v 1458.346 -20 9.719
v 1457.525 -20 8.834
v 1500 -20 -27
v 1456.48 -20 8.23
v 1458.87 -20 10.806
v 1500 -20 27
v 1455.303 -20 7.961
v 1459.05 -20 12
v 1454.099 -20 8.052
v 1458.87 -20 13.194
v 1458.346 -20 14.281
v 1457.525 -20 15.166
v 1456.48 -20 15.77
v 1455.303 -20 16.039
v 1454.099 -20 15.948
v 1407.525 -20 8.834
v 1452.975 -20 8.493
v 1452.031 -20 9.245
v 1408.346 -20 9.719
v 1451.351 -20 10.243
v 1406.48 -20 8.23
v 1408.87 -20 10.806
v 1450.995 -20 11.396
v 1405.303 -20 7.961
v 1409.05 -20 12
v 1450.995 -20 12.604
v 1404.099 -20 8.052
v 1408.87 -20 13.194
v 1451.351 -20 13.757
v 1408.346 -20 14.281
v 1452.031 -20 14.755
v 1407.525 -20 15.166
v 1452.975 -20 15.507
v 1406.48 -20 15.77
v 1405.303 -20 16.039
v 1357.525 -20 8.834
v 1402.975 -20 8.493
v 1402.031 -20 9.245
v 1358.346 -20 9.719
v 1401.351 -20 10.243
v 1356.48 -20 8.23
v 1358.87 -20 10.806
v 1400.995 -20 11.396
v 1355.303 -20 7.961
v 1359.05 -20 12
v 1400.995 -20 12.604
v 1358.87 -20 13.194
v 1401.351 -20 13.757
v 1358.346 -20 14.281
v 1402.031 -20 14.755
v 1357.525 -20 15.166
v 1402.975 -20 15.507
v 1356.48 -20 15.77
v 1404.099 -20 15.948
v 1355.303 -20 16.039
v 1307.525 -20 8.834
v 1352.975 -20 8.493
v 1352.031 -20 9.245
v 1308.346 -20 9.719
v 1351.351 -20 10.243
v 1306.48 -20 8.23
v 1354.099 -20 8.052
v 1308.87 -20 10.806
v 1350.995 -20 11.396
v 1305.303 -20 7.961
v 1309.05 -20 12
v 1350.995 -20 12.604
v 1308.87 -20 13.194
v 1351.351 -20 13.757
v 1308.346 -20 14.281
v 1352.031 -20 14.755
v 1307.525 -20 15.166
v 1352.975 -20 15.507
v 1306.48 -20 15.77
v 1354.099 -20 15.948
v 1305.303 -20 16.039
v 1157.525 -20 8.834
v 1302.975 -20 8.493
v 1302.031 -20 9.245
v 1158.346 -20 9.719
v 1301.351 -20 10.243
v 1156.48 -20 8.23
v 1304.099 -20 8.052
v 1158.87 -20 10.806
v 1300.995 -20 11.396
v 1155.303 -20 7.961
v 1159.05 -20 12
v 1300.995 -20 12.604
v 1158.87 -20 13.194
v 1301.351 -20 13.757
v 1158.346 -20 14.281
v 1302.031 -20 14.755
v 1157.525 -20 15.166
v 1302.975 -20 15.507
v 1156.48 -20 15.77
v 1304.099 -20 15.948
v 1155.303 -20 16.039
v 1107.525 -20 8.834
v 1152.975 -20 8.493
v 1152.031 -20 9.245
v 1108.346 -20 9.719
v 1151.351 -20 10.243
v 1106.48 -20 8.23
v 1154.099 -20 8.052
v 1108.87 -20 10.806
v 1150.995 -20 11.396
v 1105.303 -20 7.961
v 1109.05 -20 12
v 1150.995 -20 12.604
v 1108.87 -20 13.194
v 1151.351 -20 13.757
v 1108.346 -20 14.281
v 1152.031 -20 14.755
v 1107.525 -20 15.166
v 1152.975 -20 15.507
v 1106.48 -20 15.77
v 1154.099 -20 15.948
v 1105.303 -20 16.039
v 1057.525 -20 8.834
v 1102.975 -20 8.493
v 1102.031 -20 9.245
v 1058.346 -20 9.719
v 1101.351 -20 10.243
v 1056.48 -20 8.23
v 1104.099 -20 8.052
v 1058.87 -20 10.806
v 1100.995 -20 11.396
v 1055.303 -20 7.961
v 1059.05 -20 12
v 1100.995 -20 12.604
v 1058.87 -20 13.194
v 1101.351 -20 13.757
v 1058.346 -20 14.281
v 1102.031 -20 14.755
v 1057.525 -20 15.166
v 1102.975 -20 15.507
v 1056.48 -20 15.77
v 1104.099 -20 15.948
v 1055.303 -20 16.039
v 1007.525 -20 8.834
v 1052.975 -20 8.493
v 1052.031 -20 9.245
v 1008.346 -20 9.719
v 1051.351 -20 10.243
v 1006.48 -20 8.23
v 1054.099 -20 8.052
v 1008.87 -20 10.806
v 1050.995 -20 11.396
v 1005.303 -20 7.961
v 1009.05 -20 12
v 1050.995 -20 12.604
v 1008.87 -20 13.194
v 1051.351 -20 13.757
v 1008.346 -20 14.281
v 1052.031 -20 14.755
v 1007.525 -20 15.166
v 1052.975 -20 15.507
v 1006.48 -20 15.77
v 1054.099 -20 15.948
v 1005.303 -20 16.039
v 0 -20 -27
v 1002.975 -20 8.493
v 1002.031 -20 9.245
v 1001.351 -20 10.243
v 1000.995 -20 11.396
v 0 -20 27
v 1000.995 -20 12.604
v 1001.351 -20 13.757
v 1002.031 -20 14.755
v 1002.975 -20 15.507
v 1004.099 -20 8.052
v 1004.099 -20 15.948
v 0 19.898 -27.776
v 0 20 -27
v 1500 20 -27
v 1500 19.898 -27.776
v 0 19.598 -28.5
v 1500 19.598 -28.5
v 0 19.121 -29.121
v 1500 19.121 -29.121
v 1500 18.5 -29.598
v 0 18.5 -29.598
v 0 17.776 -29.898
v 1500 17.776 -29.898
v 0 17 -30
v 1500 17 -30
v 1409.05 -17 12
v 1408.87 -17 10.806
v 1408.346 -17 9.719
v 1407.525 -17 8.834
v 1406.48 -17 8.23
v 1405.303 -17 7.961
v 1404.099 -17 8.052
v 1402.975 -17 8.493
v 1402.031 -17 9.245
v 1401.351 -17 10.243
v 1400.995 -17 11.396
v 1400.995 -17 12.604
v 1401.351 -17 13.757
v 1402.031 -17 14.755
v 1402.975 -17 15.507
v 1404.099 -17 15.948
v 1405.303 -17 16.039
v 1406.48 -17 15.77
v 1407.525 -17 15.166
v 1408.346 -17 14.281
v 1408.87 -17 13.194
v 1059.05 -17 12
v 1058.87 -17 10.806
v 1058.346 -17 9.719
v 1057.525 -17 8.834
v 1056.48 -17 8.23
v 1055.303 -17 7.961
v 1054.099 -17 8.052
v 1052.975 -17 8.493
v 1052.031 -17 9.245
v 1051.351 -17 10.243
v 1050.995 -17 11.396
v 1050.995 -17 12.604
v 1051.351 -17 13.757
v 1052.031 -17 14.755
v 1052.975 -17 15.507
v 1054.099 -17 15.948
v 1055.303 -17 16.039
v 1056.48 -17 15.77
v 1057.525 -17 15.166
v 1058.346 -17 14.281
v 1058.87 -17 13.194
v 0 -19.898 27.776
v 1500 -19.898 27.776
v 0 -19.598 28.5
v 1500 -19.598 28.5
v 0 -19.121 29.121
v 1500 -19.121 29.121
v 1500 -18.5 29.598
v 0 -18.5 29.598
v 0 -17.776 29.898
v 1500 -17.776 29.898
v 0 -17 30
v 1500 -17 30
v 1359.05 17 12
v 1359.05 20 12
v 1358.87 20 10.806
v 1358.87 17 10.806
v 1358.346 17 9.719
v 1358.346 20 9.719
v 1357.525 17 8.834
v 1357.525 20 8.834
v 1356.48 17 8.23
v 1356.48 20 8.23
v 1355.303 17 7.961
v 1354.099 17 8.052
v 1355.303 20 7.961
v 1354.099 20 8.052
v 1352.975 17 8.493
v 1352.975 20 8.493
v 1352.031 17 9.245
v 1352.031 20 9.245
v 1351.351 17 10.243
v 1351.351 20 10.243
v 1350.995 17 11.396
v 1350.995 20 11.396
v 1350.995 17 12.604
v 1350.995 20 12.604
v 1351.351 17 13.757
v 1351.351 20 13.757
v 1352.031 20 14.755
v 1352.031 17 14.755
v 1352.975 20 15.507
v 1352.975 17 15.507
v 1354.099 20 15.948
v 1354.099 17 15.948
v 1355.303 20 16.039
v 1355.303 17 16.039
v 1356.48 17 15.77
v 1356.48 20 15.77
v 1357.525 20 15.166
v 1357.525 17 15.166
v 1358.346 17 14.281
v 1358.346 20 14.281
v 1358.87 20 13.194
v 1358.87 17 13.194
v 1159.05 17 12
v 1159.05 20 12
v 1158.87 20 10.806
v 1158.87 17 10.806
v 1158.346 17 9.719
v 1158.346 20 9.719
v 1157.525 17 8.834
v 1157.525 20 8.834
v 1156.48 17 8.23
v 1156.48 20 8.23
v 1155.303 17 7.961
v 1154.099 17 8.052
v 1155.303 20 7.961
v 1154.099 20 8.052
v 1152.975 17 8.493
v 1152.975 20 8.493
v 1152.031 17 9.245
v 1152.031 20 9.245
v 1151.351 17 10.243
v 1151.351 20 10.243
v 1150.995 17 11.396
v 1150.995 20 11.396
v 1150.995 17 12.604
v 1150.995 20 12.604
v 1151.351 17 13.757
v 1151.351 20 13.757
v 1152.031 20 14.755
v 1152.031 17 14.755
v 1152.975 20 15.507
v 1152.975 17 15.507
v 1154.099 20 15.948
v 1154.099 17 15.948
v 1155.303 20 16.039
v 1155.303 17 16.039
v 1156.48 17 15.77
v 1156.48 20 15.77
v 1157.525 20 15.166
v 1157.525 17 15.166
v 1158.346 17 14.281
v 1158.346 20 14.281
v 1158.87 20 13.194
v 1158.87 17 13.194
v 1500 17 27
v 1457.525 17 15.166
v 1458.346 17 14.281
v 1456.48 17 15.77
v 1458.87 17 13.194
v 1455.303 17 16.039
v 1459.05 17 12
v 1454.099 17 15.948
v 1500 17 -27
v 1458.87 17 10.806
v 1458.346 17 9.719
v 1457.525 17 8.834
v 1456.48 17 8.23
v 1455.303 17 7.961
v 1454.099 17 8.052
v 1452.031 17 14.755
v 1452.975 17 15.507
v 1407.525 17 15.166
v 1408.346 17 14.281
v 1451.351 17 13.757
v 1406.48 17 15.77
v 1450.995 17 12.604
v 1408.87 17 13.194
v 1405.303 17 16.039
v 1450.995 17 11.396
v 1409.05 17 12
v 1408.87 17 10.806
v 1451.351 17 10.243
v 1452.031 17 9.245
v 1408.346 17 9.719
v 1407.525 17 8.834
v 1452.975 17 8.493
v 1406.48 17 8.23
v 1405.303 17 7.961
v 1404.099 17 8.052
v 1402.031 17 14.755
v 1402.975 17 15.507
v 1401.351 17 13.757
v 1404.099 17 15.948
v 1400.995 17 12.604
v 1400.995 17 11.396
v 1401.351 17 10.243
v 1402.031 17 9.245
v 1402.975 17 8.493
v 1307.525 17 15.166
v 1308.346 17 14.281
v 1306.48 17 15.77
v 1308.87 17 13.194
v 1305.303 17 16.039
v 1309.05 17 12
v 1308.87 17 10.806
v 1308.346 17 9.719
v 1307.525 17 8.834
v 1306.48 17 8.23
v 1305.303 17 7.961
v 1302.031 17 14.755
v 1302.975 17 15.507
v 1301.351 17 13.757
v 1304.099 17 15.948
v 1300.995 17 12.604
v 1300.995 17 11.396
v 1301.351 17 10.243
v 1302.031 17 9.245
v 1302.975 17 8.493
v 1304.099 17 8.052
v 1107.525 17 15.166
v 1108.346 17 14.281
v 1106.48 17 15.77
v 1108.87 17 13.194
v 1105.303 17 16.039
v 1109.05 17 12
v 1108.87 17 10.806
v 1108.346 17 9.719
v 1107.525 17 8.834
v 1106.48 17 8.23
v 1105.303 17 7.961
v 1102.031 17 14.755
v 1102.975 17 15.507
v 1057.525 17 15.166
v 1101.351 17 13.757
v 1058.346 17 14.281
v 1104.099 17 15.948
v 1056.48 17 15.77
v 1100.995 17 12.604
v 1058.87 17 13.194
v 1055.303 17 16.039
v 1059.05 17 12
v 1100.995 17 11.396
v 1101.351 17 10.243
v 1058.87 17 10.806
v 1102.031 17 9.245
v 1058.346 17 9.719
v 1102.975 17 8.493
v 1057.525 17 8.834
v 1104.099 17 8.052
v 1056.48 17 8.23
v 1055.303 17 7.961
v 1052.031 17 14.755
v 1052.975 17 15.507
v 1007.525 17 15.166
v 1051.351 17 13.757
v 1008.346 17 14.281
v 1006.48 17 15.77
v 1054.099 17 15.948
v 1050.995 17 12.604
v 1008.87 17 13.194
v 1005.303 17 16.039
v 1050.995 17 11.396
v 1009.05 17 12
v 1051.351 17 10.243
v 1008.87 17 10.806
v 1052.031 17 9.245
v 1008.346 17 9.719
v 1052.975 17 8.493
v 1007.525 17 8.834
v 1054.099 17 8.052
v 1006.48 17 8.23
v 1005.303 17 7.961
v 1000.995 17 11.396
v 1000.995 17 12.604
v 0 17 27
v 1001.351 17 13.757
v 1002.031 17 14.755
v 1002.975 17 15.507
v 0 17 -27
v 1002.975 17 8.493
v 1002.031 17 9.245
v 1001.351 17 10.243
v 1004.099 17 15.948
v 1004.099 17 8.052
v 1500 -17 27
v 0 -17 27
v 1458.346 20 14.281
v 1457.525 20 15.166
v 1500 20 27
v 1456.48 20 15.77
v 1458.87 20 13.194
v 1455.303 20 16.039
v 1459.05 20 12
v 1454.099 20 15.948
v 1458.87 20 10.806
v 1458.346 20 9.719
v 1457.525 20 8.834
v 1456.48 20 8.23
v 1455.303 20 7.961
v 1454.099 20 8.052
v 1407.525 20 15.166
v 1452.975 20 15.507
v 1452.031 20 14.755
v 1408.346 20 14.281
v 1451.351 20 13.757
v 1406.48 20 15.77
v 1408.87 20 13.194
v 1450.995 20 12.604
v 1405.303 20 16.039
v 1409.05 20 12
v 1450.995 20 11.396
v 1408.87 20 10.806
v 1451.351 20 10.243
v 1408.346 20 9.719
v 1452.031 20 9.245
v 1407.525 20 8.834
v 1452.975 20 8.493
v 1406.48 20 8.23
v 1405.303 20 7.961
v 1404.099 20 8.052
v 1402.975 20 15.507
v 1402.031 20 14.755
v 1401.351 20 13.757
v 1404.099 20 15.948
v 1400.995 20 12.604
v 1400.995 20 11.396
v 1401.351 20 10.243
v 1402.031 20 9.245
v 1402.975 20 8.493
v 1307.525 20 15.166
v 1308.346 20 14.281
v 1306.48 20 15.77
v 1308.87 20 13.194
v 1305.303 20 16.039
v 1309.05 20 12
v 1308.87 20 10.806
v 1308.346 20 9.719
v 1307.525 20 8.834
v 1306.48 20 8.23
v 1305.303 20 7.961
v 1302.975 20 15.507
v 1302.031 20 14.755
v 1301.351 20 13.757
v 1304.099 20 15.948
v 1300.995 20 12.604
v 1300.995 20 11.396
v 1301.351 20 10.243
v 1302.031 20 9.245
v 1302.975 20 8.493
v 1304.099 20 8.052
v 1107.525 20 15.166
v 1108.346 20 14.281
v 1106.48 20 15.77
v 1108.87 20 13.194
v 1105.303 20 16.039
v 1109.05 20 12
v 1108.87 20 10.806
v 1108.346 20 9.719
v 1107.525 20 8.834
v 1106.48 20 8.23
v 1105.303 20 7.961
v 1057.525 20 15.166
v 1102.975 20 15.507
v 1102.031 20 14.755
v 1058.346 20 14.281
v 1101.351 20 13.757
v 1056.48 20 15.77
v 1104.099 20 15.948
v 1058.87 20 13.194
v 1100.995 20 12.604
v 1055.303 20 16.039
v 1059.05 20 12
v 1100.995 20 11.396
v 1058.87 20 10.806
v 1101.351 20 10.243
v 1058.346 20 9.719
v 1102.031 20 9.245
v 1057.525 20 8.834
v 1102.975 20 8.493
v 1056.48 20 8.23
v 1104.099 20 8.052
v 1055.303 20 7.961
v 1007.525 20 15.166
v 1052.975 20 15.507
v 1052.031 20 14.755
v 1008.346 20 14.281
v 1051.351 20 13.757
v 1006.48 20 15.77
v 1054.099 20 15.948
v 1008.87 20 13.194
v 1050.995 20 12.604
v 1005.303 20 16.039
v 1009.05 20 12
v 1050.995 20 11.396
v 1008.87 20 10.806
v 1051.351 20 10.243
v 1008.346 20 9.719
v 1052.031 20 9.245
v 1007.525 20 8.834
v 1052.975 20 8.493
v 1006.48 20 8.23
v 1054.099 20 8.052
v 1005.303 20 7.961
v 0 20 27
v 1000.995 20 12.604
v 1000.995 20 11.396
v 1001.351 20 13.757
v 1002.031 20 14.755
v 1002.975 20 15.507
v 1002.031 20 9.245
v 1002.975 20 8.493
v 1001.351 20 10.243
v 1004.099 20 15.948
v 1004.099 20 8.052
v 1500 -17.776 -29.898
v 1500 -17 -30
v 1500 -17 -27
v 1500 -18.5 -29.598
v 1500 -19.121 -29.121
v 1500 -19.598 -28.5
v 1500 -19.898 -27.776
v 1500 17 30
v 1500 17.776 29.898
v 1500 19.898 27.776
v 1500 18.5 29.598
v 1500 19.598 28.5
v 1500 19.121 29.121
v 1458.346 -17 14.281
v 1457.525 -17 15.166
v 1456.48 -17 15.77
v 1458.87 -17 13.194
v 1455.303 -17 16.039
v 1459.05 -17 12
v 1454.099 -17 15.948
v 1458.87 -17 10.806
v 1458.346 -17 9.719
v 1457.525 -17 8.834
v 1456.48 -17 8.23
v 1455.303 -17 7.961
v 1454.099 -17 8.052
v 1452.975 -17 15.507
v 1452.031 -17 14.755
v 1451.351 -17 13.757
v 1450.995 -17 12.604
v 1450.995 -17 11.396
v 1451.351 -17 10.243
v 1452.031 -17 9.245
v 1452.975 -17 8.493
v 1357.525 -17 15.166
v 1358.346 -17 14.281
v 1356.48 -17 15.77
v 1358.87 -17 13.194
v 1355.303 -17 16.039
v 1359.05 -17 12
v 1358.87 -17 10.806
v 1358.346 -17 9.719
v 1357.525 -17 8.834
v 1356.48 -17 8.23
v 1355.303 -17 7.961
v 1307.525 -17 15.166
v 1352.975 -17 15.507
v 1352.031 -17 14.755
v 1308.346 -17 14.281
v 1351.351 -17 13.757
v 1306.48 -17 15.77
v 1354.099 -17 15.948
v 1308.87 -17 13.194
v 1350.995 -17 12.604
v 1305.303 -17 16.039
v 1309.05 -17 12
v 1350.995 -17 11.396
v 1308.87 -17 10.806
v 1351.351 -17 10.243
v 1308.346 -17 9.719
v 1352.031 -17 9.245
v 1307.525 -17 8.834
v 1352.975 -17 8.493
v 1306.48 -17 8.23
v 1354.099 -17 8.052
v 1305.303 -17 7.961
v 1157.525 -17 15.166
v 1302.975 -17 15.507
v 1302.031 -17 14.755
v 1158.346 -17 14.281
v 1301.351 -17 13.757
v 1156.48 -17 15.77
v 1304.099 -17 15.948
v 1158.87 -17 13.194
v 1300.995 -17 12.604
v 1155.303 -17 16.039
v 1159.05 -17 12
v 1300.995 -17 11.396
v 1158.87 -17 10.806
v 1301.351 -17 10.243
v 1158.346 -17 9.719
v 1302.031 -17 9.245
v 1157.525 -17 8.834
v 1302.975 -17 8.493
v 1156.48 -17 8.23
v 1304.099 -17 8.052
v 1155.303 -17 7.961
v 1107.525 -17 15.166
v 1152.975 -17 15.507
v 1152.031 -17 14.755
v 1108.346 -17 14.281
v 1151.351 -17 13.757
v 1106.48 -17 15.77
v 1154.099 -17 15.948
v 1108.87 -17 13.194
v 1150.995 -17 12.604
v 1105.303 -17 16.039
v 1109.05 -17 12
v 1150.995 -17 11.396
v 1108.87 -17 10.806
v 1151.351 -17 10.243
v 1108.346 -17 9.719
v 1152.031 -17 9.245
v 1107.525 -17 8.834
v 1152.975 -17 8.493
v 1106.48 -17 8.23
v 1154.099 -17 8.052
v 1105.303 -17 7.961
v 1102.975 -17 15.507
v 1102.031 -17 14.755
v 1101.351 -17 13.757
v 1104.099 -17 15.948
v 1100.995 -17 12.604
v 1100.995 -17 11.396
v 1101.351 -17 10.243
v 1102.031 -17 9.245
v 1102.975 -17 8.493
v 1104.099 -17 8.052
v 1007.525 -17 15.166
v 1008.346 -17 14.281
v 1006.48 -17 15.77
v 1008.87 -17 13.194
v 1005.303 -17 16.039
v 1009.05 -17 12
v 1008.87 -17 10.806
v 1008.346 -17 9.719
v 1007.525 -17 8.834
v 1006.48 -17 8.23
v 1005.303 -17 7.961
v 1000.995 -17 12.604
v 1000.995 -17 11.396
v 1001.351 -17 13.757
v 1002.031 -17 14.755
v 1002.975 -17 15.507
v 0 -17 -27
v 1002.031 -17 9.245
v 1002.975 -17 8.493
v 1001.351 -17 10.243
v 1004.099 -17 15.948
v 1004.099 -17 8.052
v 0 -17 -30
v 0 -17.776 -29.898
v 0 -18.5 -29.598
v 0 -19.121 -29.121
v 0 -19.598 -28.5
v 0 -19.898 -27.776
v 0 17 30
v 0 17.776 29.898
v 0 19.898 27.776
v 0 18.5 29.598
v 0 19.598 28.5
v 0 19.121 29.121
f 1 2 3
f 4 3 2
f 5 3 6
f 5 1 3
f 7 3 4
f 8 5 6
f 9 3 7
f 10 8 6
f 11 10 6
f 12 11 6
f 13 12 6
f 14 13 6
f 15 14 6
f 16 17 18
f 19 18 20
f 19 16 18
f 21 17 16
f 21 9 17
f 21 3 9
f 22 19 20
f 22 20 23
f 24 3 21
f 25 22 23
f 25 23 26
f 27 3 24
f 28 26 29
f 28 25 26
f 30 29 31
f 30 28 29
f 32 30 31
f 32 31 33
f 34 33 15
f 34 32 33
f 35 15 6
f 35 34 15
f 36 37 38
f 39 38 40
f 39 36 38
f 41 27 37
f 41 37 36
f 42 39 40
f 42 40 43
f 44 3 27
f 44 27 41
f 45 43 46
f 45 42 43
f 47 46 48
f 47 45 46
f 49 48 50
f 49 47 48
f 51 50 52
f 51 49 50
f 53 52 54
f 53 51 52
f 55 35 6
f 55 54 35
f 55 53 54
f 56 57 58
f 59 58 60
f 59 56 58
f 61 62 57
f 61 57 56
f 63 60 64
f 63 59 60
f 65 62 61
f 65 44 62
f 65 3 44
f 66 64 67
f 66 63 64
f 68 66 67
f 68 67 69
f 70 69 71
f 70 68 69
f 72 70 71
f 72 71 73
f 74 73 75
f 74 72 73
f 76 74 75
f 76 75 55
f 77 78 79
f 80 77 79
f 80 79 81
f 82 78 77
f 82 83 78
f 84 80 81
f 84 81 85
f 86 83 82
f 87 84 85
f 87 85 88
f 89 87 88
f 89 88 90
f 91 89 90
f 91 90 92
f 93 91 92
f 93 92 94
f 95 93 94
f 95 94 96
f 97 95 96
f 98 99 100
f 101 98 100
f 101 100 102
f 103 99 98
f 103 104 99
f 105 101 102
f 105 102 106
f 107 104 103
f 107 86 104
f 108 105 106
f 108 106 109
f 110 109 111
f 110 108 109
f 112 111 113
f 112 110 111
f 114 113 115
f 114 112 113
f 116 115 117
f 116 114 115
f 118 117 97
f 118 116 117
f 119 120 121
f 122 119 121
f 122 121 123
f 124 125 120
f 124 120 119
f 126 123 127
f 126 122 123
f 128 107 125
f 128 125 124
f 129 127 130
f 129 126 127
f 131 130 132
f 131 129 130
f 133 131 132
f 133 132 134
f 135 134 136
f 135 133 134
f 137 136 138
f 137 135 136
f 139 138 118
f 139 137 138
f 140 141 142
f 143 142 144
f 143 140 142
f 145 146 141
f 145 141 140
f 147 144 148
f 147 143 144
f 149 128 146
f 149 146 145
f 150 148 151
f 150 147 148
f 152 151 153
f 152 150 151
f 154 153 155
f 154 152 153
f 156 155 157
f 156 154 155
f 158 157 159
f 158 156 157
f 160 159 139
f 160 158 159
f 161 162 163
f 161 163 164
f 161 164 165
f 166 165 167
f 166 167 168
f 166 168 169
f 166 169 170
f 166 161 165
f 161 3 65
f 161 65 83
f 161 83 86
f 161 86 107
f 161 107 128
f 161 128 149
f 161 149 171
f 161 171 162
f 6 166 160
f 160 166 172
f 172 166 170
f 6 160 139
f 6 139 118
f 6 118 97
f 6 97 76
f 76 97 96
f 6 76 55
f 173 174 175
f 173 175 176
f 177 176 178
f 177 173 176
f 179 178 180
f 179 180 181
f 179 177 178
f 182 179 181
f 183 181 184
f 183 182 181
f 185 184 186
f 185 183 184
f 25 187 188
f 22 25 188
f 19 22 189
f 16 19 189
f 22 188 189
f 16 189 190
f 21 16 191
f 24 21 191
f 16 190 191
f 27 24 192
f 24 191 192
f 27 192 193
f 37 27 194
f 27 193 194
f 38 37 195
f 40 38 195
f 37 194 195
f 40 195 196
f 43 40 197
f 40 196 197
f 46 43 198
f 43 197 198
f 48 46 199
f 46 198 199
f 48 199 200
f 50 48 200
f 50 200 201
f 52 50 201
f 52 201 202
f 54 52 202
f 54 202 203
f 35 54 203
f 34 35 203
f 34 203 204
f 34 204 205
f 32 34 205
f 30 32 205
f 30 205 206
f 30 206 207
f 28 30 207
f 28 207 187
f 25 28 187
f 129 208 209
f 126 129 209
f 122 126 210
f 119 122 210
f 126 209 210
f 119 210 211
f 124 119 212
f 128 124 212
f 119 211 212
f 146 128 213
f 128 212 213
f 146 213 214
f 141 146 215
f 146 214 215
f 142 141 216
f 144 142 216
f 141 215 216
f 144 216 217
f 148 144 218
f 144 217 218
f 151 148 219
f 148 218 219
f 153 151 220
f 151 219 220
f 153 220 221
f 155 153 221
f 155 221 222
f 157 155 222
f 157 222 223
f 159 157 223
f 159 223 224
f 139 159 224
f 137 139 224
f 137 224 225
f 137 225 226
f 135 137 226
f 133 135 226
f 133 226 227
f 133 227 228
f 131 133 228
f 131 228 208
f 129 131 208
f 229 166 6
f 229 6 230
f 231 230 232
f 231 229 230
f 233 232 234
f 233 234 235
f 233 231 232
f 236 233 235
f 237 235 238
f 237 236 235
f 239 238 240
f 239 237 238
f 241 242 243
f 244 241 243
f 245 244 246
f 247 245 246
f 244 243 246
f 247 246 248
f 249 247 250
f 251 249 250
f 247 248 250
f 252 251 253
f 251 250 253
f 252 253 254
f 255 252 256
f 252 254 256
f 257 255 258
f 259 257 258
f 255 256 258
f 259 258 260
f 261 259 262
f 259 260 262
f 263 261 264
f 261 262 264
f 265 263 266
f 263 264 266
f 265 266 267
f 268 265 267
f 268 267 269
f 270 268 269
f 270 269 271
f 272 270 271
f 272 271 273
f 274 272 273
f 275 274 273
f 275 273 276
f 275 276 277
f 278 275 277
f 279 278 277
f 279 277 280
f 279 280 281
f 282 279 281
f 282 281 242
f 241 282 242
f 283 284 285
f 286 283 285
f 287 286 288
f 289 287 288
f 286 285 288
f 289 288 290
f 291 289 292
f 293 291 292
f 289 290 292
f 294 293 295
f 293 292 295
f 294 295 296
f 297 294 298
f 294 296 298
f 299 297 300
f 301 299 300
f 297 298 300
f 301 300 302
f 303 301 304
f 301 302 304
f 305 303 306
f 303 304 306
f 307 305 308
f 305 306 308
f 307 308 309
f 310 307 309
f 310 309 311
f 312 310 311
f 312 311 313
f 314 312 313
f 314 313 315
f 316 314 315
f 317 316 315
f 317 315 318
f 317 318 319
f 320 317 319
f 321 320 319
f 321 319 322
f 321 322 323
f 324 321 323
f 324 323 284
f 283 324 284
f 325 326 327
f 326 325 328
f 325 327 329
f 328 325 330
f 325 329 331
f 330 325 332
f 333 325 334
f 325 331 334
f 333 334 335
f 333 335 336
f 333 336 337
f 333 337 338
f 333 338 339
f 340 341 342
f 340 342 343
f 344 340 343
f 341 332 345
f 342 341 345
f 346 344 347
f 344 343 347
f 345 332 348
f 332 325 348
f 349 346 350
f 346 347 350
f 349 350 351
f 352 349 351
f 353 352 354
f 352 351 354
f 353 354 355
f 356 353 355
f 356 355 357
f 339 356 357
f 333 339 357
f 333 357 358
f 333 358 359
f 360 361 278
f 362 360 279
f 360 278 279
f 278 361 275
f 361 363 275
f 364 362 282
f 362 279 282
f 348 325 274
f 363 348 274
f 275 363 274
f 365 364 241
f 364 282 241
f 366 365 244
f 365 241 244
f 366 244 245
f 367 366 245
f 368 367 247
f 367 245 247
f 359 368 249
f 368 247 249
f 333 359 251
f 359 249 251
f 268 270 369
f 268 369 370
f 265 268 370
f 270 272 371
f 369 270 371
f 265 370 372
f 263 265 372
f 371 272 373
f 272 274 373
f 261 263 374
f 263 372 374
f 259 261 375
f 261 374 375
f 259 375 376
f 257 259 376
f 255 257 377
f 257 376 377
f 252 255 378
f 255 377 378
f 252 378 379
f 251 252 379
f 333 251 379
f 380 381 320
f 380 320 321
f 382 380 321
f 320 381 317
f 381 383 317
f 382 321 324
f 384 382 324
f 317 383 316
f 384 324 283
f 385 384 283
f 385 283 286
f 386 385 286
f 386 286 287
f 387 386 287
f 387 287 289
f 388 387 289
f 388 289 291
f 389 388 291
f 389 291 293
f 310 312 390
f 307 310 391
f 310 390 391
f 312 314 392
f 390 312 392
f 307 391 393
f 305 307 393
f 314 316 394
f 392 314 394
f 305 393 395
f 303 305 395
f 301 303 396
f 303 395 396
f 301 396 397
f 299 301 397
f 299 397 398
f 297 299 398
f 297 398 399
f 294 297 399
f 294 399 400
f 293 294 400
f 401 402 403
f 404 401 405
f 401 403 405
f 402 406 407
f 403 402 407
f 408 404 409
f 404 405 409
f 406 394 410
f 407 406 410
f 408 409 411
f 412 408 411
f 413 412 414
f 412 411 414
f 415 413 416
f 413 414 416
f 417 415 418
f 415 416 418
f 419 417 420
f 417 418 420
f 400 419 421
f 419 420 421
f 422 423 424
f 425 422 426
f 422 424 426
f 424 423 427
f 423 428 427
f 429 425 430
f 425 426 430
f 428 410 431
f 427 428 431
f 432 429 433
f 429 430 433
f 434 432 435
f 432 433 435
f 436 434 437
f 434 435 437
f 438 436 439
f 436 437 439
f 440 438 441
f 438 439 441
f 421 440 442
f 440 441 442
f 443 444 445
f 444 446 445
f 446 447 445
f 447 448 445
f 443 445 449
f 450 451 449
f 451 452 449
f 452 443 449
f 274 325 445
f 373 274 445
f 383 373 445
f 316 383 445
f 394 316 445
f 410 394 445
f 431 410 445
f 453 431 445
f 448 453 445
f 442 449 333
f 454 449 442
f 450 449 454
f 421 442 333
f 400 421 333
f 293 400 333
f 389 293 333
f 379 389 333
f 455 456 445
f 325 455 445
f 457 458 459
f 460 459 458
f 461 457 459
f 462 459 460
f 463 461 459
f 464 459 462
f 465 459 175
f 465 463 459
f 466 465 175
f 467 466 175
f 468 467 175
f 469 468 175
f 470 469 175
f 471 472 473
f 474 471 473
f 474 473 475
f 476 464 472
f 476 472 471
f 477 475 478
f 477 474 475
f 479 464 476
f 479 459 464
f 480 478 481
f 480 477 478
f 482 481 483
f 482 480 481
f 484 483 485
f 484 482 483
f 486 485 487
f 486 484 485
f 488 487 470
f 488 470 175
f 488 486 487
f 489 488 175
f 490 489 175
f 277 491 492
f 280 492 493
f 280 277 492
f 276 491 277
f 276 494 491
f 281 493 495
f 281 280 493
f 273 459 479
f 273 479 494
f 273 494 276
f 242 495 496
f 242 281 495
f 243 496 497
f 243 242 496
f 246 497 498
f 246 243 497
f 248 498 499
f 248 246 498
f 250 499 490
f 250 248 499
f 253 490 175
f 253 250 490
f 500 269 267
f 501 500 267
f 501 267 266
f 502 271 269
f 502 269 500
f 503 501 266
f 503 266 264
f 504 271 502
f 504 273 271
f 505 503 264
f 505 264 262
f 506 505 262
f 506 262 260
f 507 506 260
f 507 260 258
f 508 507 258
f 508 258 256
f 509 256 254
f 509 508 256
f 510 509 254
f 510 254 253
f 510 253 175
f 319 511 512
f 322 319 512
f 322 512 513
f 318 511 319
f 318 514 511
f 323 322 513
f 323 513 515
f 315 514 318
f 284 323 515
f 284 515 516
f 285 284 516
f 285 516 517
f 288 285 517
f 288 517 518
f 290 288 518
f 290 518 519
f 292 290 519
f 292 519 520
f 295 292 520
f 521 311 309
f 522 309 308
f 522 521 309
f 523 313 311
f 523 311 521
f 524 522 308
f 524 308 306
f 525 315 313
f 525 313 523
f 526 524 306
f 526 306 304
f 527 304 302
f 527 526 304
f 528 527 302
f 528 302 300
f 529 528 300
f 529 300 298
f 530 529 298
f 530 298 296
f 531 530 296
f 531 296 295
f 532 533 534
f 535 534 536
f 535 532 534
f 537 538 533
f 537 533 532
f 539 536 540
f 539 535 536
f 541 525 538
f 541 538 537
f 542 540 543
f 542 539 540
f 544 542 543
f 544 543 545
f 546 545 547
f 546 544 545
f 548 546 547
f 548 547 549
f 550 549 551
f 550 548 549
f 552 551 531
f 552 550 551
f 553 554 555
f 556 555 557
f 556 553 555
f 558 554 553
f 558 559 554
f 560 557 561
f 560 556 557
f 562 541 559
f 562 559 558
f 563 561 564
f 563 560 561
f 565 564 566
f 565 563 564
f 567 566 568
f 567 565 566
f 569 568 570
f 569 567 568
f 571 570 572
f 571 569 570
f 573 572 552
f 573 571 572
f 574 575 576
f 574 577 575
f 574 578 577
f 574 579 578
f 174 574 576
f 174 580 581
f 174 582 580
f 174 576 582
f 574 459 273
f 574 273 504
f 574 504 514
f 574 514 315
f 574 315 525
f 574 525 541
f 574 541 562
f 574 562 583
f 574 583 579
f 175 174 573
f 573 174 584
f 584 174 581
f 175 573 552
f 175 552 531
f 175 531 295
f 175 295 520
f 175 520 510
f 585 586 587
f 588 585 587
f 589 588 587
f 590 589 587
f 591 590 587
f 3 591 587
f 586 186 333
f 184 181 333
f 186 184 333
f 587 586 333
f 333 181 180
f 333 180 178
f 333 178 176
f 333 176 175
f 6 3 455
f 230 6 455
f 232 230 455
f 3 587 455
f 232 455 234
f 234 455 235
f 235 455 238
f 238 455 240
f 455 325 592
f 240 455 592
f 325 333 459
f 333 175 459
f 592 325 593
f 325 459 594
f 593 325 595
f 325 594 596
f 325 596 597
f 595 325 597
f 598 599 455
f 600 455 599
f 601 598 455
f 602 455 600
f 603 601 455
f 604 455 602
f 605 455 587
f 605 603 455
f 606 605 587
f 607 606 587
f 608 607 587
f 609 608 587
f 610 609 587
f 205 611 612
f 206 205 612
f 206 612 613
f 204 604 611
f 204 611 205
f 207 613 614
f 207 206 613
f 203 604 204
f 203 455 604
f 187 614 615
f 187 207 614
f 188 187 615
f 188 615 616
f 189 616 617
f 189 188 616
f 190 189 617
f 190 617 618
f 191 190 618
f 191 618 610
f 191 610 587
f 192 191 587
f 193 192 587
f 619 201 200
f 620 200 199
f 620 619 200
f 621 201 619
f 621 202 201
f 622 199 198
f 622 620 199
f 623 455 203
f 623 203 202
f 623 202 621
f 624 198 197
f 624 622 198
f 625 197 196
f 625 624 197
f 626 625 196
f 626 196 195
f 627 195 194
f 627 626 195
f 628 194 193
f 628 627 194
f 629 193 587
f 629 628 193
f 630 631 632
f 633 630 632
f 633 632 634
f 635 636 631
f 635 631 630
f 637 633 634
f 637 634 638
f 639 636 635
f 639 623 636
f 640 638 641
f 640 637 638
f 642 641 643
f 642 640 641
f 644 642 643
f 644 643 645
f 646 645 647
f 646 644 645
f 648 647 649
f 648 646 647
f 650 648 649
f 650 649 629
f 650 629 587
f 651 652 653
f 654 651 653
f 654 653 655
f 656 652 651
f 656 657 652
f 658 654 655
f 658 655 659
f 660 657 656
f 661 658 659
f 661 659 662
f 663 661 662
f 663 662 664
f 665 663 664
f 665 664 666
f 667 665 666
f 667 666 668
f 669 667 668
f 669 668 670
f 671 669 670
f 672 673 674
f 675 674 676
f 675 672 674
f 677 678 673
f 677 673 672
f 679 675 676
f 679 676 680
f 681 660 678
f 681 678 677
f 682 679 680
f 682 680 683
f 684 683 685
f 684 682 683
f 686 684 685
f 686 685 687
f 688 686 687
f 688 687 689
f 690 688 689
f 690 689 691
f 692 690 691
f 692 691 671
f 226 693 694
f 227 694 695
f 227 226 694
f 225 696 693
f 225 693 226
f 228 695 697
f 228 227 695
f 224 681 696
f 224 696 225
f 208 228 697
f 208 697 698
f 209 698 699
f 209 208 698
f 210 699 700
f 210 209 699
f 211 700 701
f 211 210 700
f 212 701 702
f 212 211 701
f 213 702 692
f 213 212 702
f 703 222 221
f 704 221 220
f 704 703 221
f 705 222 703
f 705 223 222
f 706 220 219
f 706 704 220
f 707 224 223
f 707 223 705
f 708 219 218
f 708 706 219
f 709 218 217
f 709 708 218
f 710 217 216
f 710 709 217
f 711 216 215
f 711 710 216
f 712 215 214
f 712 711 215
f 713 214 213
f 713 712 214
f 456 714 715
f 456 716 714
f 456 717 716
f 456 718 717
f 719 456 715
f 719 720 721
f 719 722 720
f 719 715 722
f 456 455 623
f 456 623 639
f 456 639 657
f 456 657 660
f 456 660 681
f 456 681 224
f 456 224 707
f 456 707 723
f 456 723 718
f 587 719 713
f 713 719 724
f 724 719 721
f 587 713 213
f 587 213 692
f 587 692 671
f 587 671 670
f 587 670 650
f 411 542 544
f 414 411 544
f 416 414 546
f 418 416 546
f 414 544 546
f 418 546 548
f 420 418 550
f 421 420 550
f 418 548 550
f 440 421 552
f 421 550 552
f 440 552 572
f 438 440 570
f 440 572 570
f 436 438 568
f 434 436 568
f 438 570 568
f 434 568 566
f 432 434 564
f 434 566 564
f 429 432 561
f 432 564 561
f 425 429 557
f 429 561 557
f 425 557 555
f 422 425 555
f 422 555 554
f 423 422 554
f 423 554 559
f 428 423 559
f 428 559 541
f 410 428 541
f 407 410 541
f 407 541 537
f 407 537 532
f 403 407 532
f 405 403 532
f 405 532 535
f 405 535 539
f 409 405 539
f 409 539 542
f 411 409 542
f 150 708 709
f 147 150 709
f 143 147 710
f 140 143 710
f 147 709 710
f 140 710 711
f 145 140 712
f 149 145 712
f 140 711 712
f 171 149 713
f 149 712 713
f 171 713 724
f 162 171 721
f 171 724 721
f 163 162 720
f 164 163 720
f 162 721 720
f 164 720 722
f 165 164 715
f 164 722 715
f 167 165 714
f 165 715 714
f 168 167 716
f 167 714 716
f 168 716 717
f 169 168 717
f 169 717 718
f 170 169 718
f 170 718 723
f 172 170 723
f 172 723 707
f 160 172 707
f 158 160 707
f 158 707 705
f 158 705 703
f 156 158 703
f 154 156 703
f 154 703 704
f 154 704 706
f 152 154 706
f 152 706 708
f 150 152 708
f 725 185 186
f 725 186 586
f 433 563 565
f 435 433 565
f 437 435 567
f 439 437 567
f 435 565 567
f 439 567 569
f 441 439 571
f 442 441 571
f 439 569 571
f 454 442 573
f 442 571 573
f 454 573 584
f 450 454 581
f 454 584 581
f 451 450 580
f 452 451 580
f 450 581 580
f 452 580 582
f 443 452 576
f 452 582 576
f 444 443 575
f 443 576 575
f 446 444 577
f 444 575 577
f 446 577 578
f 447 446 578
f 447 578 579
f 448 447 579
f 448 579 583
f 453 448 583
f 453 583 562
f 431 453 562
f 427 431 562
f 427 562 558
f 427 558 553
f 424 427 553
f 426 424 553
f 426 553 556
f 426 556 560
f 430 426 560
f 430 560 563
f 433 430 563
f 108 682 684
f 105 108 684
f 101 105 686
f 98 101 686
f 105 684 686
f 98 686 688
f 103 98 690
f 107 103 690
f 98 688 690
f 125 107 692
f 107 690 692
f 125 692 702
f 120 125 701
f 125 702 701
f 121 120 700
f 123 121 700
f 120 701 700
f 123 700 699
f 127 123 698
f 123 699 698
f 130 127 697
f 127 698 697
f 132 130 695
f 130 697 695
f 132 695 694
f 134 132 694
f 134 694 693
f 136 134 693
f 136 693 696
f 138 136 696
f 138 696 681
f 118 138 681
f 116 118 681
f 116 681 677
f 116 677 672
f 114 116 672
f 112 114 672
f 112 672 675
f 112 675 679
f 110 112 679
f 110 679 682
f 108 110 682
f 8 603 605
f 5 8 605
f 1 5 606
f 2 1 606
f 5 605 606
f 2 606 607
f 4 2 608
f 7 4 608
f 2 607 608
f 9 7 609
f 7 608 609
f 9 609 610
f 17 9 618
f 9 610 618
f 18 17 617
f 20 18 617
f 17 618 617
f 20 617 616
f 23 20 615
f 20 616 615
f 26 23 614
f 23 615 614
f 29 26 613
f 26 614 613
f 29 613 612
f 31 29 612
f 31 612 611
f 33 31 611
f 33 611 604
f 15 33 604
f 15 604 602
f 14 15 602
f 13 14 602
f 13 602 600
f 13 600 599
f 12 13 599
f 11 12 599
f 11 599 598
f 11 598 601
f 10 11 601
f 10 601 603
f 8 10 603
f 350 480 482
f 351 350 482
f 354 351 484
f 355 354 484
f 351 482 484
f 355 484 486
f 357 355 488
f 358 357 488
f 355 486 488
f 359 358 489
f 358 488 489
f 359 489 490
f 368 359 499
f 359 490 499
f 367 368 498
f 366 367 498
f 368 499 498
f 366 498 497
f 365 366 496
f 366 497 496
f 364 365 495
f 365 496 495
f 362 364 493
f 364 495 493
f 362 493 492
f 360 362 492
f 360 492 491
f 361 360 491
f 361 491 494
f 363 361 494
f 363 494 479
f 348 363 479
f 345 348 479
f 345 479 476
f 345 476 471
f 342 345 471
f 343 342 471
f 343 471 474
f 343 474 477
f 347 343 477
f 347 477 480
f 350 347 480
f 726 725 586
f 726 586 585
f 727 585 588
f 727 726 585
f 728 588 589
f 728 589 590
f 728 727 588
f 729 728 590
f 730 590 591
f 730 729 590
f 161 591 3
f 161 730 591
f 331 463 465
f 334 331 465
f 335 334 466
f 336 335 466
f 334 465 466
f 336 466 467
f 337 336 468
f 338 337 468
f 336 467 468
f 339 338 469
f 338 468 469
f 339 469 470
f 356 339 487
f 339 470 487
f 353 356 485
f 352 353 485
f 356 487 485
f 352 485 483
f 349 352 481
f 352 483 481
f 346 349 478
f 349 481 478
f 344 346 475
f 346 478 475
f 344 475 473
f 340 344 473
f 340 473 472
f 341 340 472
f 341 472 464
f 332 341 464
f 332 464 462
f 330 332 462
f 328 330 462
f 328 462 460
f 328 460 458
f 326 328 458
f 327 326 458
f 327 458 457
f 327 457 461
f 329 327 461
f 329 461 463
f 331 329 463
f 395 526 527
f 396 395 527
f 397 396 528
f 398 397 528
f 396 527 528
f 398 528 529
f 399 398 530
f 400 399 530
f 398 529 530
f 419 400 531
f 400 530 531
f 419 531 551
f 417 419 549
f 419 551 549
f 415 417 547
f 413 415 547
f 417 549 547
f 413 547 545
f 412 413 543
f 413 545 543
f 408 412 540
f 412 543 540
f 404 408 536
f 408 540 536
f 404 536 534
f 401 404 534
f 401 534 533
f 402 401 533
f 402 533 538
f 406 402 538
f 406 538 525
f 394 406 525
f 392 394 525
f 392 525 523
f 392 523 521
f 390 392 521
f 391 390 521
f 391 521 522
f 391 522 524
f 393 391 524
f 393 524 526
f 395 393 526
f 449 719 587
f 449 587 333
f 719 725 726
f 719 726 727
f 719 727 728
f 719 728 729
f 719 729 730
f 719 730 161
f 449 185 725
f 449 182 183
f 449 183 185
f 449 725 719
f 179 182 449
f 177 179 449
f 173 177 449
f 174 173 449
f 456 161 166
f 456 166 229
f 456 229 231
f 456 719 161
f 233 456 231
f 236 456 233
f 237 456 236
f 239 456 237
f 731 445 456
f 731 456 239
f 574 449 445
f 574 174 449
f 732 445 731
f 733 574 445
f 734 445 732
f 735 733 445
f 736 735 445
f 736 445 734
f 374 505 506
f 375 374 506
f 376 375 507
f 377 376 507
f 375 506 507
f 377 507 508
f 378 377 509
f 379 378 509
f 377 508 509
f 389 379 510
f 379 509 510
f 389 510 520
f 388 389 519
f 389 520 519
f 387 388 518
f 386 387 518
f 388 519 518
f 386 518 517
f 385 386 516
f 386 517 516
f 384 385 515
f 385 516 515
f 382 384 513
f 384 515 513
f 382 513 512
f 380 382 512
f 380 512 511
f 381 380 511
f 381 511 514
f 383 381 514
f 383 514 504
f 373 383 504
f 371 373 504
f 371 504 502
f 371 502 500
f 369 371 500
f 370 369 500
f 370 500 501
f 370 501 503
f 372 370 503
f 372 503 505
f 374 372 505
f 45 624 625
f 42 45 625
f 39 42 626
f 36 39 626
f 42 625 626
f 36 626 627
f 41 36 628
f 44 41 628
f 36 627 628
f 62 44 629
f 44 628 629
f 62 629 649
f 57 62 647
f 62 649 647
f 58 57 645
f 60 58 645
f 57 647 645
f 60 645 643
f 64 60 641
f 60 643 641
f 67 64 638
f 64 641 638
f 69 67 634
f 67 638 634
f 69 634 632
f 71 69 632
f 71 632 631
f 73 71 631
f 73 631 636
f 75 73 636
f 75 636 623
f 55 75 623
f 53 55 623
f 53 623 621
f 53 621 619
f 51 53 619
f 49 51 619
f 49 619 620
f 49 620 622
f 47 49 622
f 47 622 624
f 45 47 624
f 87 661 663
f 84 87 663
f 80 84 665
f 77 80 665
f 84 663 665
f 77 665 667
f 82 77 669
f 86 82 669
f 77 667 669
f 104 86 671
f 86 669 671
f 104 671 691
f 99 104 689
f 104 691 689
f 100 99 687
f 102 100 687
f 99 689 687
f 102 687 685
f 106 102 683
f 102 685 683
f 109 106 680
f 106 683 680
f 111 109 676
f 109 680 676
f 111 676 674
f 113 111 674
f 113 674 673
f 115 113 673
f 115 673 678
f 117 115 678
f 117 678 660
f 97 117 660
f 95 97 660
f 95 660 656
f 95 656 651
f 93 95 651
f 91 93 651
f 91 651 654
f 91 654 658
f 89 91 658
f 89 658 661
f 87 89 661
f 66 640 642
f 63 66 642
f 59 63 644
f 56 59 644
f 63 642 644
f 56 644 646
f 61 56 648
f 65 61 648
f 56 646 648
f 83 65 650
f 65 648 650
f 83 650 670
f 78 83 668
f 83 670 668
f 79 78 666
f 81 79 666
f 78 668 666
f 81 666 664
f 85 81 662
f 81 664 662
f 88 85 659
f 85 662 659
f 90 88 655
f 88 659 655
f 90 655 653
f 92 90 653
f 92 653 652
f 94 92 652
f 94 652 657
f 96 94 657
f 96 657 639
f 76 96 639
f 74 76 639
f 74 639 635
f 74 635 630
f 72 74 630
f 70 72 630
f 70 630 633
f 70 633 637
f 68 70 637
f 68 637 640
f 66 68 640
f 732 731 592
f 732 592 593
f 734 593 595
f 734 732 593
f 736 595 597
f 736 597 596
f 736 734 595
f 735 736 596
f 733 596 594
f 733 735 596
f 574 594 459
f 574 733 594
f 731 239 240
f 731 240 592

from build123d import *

# Parameters (mm, degrees)
SKETCH_1_W          = 54
SKETCH_1_H          = 34
EXTRUDE_1_DEPTH     = 1500
SKETCH_2_R          = 4.05
CUT_EXTRUDE_1_DEPTH = 41


with BuildPart() as part:
    # Эскиз1 → Вытянуть-Тонкостенный1 (new body)
    with BuildSketch(Plane(origin=(0, 0, 0), x_dir=(0, 0, -1), z_dir=(1, 0, 0))):
        with BuildLine():
            Line((30, 17), (30, -17))
            ThreePointArc((30, -17), (29.121320344, -19.121320344), (27, -20))
            Line((27, -20), (-27, -20))
            ThreePointArc((-27, -20), (-29.121320344, -19.121320344), (-30, -17))
            Line((-30, -17), (-30, 17))
            ThreePointArc((-30, 17), (-29.121320344, 19.121320344), (-27, 20))
            Line((-27, 20), (27, 20))
            ThreePointArc((27, 20), (29.121320344, 19.121320344), (30, 17))
        make_face()
        Rectangle(SKETCH_1_W, SKETCH_1_H, mode=Mode.SUBTRACT)
    extrude(amount=EXTRUDE_1_DEPTH)

    # Эскиз2 → Вырез-Вытянуть1 (cut, through all)
    with BuildSketch(Plane(origin=(0, 20, 0), x_dir=(1, 0, 0), z_dir=(0, 1, 0))):
        with Locations((1455, -12)):
            Circle(SKETCH_2_R)
        with Locations((1405, -12)):
            Circle(SKETCH_2_R)
        with Locations((1355, -12)):
            Circle(SKETCH_2_R)
        with Locations((1305, -12)):
            Circle(SKETCH_2_R)
        with Locations((1155, -12)):
            Circle(SKETCH_2_R)
        with Locations((1105, -12)):
            Circle(SKETCH_2_R)
        with Locations((1055, -12)):
            Circle(SKETCH_2_R)
        with Locations((1005, -12)):
            Circle(SKETCH_2_R)
    extrude(amount=-CUT_EXTRUDE_1_DEPTH, mode=Mode.SUBTRACT)


solid = part.part
